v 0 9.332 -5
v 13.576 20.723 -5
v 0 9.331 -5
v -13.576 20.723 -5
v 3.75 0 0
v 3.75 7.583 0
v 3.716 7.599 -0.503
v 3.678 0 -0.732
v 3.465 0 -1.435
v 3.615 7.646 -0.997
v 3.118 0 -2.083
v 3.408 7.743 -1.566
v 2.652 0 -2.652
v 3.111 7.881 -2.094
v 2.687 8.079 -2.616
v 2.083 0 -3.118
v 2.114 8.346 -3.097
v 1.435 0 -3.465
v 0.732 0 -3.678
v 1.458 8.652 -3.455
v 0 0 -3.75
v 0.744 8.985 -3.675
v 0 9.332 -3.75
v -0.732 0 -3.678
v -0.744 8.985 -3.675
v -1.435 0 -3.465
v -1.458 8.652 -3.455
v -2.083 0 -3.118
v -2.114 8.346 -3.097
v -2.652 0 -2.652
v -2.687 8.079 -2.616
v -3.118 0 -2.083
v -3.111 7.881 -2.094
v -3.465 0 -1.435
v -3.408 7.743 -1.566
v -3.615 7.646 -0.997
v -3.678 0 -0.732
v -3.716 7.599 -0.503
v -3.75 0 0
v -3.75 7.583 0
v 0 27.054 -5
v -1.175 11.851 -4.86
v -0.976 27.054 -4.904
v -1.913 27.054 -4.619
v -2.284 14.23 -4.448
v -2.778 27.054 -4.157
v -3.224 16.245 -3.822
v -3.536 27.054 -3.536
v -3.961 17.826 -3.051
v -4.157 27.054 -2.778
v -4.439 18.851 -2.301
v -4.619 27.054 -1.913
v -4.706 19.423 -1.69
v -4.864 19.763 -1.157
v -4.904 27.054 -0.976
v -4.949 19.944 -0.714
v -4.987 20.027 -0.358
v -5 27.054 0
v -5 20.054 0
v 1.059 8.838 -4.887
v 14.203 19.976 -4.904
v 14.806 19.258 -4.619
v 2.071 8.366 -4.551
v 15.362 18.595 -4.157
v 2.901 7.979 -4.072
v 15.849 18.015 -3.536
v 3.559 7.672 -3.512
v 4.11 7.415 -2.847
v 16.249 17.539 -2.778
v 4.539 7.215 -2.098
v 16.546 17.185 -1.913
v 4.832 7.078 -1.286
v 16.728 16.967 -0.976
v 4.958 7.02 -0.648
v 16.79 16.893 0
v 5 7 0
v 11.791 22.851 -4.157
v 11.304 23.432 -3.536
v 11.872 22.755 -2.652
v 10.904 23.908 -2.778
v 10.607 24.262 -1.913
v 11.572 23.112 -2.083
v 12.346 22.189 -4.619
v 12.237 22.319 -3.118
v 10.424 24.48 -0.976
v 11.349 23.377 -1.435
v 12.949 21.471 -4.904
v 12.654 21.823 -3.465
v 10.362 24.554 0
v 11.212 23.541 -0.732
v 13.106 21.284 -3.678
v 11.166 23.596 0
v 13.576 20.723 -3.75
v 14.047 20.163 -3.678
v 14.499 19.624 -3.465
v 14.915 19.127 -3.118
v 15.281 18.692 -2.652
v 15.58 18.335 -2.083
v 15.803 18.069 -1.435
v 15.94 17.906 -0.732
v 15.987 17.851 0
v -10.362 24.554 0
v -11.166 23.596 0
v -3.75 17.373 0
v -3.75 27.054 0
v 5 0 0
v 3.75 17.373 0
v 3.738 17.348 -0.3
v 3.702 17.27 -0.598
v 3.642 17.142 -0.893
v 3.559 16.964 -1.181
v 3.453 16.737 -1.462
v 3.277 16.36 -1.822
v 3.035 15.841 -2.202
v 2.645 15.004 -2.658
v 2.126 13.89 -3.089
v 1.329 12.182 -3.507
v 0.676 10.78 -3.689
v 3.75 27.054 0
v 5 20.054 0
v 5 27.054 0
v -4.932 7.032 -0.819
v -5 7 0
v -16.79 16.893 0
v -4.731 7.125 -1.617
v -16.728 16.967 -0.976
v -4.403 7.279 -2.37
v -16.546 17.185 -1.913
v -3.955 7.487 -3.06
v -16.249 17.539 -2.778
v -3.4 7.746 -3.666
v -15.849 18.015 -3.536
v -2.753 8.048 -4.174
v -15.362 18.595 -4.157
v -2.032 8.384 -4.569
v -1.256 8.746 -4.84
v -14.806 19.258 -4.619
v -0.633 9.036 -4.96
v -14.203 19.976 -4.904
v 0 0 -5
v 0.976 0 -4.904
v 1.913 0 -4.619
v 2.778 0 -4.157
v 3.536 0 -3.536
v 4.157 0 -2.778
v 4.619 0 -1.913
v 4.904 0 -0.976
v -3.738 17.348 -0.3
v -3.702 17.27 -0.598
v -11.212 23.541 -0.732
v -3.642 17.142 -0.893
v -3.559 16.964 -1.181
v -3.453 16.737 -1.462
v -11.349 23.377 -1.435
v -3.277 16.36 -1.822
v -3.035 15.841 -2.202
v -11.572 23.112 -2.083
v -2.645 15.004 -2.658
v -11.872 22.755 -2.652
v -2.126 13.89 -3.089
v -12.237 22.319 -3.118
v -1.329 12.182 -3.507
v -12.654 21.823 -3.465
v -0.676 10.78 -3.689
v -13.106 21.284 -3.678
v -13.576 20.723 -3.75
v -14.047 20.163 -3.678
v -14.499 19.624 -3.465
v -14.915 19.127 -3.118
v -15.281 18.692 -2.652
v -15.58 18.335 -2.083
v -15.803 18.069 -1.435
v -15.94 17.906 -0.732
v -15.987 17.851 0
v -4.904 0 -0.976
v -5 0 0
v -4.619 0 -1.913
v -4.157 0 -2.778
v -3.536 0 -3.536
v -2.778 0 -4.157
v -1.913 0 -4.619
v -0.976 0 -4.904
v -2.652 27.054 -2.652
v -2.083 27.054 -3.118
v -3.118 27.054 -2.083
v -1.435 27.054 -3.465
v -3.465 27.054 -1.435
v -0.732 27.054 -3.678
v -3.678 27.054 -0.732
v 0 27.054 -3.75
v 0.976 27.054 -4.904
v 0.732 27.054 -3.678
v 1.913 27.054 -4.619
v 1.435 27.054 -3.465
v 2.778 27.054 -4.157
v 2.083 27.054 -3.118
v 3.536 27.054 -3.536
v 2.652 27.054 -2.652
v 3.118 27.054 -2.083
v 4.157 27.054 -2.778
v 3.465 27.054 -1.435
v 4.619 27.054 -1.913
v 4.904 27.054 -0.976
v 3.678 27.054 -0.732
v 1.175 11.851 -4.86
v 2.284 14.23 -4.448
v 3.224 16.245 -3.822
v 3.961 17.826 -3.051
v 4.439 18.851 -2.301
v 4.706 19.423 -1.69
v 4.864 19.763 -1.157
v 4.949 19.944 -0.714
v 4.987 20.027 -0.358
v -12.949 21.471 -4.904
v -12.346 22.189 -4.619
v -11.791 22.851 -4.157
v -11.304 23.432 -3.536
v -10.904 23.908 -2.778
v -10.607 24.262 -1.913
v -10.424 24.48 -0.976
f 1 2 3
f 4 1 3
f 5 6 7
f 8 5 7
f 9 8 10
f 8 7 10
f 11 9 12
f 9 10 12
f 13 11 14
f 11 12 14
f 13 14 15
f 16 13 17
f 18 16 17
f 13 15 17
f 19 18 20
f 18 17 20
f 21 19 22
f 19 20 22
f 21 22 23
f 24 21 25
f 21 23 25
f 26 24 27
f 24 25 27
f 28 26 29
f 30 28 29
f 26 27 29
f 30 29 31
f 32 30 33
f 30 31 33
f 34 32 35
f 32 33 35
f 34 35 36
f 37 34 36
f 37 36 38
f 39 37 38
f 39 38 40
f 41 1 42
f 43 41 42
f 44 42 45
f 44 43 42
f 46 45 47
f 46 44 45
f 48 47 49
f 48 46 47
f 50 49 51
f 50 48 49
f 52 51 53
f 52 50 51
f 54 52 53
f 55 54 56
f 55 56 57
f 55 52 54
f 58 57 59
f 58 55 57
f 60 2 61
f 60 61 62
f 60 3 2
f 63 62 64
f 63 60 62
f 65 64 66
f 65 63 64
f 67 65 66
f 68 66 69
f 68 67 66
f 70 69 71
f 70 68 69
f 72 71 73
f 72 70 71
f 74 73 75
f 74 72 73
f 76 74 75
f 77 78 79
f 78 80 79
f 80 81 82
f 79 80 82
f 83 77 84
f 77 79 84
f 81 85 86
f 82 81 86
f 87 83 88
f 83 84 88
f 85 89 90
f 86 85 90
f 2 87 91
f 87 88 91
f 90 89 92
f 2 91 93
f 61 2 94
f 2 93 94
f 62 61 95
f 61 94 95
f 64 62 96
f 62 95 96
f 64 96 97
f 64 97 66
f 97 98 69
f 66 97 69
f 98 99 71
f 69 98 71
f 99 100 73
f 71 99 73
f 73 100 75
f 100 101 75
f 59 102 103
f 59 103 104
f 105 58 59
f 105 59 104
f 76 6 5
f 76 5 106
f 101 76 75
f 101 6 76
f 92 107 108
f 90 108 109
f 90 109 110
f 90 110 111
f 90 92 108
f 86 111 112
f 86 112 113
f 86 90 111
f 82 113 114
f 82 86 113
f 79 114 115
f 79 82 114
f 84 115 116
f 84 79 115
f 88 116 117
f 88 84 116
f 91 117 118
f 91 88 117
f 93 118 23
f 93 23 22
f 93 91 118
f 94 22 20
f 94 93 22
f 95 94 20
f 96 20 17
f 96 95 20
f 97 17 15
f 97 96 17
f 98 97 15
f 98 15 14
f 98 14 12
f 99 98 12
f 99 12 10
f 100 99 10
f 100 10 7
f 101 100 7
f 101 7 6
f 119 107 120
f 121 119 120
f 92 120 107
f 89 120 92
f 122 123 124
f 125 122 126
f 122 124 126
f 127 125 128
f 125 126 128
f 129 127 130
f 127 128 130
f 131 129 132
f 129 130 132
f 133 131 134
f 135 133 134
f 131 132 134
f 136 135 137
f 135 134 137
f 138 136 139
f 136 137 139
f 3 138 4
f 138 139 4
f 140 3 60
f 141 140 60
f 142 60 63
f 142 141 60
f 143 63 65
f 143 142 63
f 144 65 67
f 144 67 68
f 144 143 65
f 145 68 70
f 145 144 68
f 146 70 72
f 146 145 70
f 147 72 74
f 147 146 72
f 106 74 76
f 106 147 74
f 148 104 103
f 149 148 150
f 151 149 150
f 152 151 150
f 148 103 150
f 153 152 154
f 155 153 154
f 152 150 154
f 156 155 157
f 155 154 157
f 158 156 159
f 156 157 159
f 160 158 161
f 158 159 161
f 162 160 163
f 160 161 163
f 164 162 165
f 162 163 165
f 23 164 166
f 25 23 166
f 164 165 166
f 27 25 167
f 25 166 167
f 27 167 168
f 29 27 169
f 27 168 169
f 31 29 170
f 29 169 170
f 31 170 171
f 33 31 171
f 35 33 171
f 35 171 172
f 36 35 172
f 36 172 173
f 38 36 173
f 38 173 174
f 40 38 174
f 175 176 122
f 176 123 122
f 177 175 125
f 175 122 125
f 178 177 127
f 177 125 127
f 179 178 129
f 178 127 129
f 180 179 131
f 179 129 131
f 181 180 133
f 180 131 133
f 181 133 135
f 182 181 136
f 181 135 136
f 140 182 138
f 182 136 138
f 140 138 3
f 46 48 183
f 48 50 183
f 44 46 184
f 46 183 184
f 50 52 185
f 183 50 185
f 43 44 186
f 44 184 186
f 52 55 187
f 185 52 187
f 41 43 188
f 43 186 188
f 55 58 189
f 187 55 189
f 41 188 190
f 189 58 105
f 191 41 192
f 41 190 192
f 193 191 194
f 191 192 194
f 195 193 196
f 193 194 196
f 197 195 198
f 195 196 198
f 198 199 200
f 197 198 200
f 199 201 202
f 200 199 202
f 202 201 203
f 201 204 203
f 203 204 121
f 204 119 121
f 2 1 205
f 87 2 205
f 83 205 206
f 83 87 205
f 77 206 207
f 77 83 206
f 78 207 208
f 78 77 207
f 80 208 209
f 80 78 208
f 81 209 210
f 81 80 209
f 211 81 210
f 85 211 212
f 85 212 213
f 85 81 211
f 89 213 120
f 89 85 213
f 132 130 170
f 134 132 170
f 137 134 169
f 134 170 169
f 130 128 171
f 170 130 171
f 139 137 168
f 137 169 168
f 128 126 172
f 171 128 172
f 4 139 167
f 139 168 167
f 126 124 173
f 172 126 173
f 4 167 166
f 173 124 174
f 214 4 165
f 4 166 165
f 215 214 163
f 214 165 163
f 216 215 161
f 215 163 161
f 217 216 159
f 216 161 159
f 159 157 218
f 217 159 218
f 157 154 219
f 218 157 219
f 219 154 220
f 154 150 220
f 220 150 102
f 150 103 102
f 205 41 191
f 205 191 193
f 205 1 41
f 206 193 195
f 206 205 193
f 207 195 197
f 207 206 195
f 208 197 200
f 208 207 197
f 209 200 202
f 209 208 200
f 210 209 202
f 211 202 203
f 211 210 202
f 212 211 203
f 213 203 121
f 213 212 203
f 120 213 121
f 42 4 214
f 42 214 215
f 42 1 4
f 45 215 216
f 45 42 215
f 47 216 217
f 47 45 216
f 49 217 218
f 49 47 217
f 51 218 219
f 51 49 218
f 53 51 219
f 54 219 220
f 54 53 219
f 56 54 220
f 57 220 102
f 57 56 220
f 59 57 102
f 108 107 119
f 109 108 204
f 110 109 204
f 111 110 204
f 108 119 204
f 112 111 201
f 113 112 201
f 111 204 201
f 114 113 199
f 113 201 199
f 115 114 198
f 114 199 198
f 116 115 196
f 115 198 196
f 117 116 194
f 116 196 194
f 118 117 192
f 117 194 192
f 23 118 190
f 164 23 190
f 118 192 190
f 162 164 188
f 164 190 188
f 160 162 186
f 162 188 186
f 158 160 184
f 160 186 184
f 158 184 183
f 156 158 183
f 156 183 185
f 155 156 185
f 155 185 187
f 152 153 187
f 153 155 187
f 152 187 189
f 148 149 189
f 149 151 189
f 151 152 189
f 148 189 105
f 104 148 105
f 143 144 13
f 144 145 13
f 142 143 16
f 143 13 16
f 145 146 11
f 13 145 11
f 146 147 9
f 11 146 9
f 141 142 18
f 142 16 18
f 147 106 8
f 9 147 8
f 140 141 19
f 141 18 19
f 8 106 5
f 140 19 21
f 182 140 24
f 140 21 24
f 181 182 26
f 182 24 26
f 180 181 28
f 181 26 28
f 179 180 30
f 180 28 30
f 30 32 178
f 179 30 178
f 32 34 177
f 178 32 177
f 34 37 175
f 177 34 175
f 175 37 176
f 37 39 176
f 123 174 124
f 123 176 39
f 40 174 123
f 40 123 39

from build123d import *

# Parameters (mm, degrees)
EXTRUDE_659_DEPTH           = 5
SKETCH_4_R                  = 3.75
CUT_EXTRUDE_1016_DEPTH      = 33.230936168
CUT_EXTRUDE_1190_REACH      = 40.468
CUT_EXTRUDE_1190_END_RADIUS = 3.75
SKETCH_5_R                  = 3.75
FILLET_8_R                  = 5


with BuildPart() as part:
    # Эскиз3 → Extrude 659 (new, symmetric)
    with BuildSketch(Plane.XY):
        Polygon((-5, 7), (-16.790187199, 16.89314173), (-10.362311102, 24.553586161), (-5, 20.054072893), (-5, 27.054072893), (5, 27.054072893), (5, 20.054072893), (10.362311102, 24.553586161), (16.790187199, 16.89314173), (5, 7), (5, 0), (-5, 0), align=None)
    extrude(amount=EXTRUDE_659_DEPTH, both=True)

    # Эскиз4 → Cut-Extrude 1016 (cut, through all)
    with BuildSketch(Plane(origin=(0, 27.054072893, 0), x_dir=(-1, 0, 0), z_dir=(0, 1, 0))):
        with Locations(Location((0, 0, 0), (0, 0, 90))):
            Circle(SKETCH_4_R)
    extrude(amount=-CUT_EXTRUDE_1016_DEPTH, mode=Mode.SUBTRACT)

    # Cut-Extrude 1190: up to this cylinder (the profile starts outside it)
    cut_extrude_1190_end = Plane(origin=(0, 20.723364, 0), z_dir=(0, 1, 0)) * Cylinder(CUT_EXTRUDE_1190_END_RADIUS, 89.436, mode=Mode.PRIVATE)
    # Эскиз5 → Cut-Extrude 1190 (cut, up to the surface)
    with BuildSketch(Plane(origin=(-18.171134778, 15.247392491, 0), x_dir=(0, 0, 1), z_dir=(-0.7660444431189745, 0.6427876096865438, 0)), mode=Mode.PRIVATE) as cut_extrude_1190_sk1:
        with Locations(Location((0, 7.148373053, 0), (0, 0, 270))):
            Circle(SKETCH_5_R)
    cut_extrude_1190_tool1 = extrude(cut_extrude_1190_sk1.sketch, amount=-CUT_EXTRUDE_1190_REACH, mode=Mode.PRIVATE) - cut_extrude_1190_end
    cut_extrude_1190 = cut_extrude_1190_tool1.solids().sort_by_distance((-13.576249, 20.723364, 0))[0]
    add(cut_extrude_1190, mode=Mode.SUBTRACT)

    # Зеркальное отражение1: Cut-Extrude 1190 across plane
    add(cut_extrude_1190.mirror(Plane(origin=(0, 0, 0), x_dir=(0, 0, 1), z_dir=(1, 0, 0))), mode=Mode.SUBTRACT)

    # Скругление8
    fillet_8_edges = [part.edges().sort_by_distance(p)[0] for p in [
        (7.681155551, 22.303829527, -5),
        (5, 23.554072893, -5),
        (-5, 23.554072893, -5),
        (-7.681155551, 22.303829527, -5),
        (-10.895093599, 11.946570865, -5),
        (-5, 3.5, -5),
        (5, 3.5, -5),
        (10.895093599, 11.946570865, -5),
        (-5, 3.5, 5),
        (5, 3.5, 5),
        (10.895093599, 11.946570865, 5),
        (7.681155551, 22.303829527, 5),
        (5, 23.554072893, 5),
        (-5, 23.554072893, 5),
        (-7.681155551, 22.303829527, 5),
        (-10.895093599, 11.946570865, 5),
    ]]
    fillet(fillet_8_edges, radius=FILLET_8_R - 0.0001)  # a hair under: the kernel refuses the full size

    # Split Bodies 2695
    split(bisect_by=Plane.XY, keep=Keep.BOTTOM)


solid = part.part
